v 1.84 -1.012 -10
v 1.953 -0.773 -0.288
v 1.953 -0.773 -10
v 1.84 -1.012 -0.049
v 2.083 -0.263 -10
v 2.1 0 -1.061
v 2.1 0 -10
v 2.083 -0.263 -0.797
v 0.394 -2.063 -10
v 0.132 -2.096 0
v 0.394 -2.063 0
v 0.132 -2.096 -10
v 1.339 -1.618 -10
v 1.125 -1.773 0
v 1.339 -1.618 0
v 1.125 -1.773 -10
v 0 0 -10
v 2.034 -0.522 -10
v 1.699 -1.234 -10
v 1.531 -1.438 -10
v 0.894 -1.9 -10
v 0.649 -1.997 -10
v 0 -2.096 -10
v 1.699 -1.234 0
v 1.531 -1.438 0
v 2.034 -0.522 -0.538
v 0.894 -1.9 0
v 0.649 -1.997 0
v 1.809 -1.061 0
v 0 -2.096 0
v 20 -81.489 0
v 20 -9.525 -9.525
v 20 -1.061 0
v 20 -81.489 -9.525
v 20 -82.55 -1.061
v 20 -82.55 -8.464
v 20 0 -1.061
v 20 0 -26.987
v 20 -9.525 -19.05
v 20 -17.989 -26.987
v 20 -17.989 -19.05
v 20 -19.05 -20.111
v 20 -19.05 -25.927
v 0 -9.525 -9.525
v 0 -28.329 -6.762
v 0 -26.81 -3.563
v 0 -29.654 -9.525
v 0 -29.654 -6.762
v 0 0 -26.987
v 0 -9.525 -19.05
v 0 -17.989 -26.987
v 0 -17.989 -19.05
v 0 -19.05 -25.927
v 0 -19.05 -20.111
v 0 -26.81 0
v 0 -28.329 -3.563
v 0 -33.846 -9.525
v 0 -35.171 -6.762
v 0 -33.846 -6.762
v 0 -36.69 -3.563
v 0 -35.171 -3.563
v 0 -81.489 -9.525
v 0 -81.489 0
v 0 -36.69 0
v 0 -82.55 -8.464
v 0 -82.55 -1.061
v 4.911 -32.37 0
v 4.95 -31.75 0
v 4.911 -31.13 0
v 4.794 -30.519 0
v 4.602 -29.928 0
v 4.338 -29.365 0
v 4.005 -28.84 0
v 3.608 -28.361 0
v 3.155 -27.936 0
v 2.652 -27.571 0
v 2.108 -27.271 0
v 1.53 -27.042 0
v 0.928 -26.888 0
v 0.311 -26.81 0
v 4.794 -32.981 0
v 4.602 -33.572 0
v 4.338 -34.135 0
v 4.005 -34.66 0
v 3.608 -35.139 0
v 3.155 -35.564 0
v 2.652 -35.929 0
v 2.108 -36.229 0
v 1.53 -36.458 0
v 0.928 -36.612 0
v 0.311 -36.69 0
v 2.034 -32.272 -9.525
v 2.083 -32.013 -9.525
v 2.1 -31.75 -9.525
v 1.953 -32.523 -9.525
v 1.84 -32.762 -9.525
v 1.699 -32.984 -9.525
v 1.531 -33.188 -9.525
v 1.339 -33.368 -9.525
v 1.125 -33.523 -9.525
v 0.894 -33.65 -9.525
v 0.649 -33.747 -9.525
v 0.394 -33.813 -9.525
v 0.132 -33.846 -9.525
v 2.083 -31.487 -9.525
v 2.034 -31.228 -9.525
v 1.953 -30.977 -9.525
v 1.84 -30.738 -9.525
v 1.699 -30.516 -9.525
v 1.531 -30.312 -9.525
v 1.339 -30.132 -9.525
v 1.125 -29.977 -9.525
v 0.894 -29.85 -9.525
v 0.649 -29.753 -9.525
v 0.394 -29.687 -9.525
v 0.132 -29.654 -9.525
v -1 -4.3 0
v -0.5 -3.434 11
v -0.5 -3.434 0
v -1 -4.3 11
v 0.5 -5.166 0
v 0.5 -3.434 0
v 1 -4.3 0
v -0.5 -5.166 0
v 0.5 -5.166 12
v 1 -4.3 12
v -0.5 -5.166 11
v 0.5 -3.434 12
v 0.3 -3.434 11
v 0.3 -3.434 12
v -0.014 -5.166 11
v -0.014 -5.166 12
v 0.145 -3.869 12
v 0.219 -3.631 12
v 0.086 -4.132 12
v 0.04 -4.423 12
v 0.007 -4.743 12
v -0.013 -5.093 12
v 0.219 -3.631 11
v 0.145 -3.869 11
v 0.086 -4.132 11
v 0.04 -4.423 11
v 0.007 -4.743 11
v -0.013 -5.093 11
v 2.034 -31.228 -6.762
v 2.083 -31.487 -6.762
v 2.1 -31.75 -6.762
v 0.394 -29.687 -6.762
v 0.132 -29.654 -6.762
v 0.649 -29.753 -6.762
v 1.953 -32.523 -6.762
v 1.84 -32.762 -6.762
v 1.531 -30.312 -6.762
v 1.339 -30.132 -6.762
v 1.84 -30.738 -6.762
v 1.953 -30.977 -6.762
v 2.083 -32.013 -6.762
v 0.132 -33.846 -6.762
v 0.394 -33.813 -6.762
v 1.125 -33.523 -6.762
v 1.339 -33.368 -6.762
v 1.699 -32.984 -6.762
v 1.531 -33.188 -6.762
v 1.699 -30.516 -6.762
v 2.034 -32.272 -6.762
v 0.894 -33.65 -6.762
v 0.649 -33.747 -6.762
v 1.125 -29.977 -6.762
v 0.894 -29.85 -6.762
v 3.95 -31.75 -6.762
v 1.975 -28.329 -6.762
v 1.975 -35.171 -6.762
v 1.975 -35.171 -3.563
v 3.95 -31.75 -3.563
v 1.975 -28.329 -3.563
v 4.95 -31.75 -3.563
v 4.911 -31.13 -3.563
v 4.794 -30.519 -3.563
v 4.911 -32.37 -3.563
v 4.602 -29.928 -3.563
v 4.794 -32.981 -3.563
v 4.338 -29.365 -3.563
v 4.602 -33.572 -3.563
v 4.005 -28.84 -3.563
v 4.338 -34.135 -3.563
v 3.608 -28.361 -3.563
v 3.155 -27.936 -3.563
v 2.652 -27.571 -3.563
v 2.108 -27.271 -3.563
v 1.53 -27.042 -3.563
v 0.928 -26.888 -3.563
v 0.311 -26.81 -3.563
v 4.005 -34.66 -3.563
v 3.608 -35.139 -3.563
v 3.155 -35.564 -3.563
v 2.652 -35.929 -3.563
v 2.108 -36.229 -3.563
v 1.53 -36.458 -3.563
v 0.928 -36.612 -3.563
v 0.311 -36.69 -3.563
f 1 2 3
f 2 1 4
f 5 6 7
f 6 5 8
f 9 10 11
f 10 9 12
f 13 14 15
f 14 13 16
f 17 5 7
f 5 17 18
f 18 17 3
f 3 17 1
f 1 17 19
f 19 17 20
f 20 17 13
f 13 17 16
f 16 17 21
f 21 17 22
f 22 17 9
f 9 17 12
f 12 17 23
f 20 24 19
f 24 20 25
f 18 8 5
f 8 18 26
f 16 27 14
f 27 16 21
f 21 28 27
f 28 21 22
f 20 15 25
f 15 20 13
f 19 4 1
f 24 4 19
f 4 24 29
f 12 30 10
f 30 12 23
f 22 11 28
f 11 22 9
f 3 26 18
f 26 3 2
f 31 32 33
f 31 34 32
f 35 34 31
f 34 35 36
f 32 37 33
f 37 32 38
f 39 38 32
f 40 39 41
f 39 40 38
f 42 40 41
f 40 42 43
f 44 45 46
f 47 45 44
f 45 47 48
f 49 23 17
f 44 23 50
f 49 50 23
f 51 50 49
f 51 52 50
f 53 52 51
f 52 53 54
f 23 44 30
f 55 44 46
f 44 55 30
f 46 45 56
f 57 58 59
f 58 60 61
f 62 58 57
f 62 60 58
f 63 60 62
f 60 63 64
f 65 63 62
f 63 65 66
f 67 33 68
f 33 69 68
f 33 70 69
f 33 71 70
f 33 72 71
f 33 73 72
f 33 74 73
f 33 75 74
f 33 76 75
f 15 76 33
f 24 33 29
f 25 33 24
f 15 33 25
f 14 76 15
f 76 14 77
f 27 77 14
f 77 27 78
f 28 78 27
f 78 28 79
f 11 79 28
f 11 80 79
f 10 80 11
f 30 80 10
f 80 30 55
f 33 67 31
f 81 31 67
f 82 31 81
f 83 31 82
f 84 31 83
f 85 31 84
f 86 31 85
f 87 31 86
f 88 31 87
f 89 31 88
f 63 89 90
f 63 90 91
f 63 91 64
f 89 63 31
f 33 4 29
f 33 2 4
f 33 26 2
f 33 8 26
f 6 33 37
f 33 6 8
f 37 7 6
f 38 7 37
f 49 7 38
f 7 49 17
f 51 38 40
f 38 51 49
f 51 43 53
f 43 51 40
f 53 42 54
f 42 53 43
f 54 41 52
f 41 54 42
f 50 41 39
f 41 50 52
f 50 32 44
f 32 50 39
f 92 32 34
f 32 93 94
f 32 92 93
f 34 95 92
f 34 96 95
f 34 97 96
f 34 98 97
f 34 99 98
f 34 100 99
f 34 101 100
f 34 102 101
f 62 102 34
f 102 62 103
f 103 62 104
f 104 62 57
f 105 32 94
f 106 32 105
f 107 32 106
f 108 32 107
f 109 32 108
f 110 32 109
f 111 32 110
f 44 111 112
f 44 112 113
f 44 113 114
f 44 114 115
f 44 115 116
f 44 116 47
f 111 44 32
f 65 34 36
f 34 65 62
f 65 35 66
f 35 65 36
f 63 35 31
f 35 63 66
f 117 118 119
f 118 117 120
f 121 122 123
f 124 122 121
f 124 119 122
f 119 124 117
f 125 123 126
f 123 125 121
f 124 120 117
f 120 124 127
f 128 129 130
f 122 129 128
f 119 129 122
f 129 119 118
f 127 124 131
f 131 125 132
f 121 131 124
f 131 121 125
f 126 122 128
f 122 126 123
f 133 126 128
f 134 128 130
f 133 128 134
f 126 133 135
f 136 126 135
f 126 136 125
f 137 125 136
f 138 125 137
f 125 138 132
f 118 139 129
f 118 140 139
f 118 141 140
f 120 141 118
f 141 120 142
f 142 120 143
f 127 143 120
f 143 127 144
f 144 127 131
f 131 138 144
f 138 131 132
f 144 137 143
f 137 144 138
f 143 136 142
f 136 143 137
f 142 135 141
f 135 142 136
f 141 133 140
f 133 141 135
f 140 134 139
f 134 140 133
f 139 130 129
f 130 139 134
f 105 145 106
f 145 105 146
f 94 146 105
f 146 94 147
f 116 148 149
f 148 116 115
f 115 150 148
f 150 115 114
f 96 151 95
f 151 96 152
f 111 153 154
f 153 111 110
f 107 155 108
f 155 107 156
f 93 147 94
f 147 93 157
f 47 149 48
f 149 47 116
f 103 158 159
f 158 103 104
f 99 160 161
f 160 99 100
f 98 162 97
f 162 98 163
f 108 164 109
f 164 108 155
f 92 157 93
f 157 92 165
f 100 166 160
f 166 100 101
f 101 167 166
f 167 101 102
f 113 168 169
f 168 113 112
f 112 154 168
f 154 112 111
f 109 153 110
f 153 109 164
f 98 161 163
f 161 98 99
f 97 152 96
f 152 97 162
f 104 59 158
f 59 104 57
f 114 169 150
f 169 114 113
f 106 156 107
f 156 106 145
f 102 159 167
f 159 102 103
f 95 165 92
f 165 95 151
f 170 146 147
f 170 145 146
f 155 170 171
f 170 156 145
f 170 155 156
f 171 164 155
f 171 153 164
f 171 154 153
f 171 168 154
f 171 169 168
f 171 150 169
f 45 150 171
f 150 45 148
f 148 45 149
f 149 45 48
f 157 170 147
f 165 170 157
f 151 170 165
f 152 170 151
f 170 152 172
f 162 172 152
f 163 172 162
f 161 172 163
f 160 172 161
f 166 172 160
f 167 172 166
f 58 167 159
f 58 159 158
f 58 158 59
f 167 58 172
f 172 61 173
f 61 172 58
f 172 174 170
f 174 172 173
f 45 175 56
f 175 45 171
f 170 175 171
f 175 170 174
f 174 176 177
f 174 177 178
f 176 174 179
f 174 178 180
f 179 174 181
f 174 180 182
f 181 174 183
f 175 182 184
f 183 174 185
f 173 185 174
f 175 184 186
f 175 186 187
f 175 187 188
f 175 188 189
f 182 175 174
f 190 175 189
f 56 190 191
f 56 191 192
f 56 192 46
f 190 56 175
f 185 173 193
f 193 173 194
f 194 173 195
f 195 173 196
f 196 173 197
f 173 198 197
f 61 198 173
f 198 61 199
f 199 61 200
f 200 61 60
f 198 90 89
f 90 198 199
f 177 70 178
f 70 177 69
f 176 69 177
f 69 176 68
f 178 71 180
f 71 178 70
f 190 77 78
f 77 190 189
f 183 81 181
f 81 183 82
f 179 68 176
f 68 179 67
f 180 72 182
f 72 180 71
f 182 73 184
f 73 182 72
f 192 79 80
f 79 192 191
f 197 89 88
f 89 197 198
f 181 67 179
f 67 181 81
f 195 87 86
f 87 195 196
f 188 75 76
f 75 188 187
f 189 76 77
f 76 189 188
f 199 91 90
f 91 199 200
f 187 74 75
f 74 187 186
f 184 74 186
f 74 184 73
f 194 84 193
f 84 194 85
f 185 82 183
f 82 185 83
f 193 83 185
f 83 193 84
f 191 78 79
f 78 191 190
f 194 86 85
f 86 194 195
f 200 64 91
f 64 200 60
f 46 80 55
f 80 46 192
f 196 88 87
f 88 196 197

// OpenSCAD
//Source: https://en.wikibooks.org/wiki/OpenSCAD_User_Manual/undersized_circular_objects
function circumscribed_diameter(diameter, fn) = (diameter * 1/cos(180/fn));

module wrench (length, size, is_metric=true, size_txt=undef) {    
    // Convert diameter if imperial, 25.4mm == 1"
    diameter_conv = (is_metric) ? size : (size * 25.4);
    
    // Circumscribed diameter
    circum_diameter = circumscribed_diameter(diameter_conv, 6);
    
    difference () {
        // Create cylinder object with chamfer to hold wrench
        union () {
            linear_extrude(length)
                circle(d=circum_diameter,$fn=6);
            
            translate([0,0,length])
                cylinder(h=2,
                    d1=circum_diameter, 
                    d2=circum_diameter*0.8, 
                    $fn=6);
        }
        
        custom_txt = is_undef(size_txt) ? str(size) : size_txt;
        
        // Subtract text
        translate([0,0,length+1])
            linear_extrude(2)
            text(custom_txt, size=diameter_conv*0.4, halign="center", valign="center");
    }
}

module french_cleat (length) {
    ply = 3/4*25.4;         // 3/4" plywood thickness
    rabbet = 3/8*25.4;      // Rabbet depth
    cleat = 2.5*25.4;         // Cleat mininimum height
    sixteenth = 1/16*25.4;  // 1/16" for tolerance

    // French cleat polygon
    p0 = [0,0];
    p1 = [rabbet-sixteenth,0];
    p2 = [p1[0],rabbet];
    p3 = [p2[0]+rabbet,rabbet];
    p4 = [p3[0],-cleat];
    p5 = [p4[0]+rabbet,-cleat];
    p6 = [p5[0], ply];
    p7 = [0, ply];
    
    points = [
        p0,
        p1, 
        p2,
        p3,
        p4,
        p5,
        p6,
        p7
    ];

    difference () {
        translate([length,-ply,-p6[0]]) {
            rotate([0,-90,0]) {
                linear_extrude(length) {
                    difference () {
                        polygon(points);
                        
                        chamfer_corners = [
                            p0,
                            p1,
                            p4,
                            p5,
                            p6
                        ];
                    
                        // For each corner, apply a chamfer
                        for(corner = chamfer_corners) {
                            translate([corner[0], corner[1], 0])
                                rotate([0,0,45])
                                square(1.5, center=true);
                        }
                    }
                }
            }
        }
        
        num_mount_holes = floor(length/50);
        hole_spacing = length/num_mount_holes;
            
        // Mounting hole(s)
        for (i = [1:num_mount_holes]) {
            translate([i*hole_spacing - hole_spacing/2,-1.25*25.4,-3/8/2*25.4-1.5])  
                embedded_m4_nut(10, recessed=5); 
        }
    }
}

/**
 * @brief Not intended to be called directly.
 * Creates through hole with nut and clearance
 */
module create_recessed_nut (length, recessed=0, bolt_diameter, nut_diameter, nut_height) {
    union () {
        // Bolt
        cylinder(h=length, d=bolt_diameter, $fn=50);
        
        // Nut
        translate([0,0,length])
            cylinder(h=nut_height, d=nut_diameter, $fn=6);
        
        // Optional clearance
        if (recessed > 0) {
            translate([0,0,length+nut_height])
                cylinder(h=recessed,d=nut_diameter+2, $fn=50);
        }
    }
}

// Measurements taken from M4 nuts and bolts
module embedded_m4_nut (length, recessed=0) {
    bolt_diameter = 4 + 0.2;
    
    nut_diameter = 7.8 + 0.1;
    nut_height = 3 + 0.2;
    
    translate([0,0,-length])
        create_recessed_nut(length, recessed, bolt_diameter, nut_diameter, nut_height);
}

difference () {
   union () {
        // Group wrenches onto french cleat holder
        french_cleat(20);

        // TODO Y-shift
        translate([0, -4.3, 0])
            // TODO Is diameter the correct parameter??
            wrench(10);
            
    }

    translate([0,-1.25*25.4,-3/8/2*25.4-2])  
        embedded_m4_nut(10, recessed=5); 
}
